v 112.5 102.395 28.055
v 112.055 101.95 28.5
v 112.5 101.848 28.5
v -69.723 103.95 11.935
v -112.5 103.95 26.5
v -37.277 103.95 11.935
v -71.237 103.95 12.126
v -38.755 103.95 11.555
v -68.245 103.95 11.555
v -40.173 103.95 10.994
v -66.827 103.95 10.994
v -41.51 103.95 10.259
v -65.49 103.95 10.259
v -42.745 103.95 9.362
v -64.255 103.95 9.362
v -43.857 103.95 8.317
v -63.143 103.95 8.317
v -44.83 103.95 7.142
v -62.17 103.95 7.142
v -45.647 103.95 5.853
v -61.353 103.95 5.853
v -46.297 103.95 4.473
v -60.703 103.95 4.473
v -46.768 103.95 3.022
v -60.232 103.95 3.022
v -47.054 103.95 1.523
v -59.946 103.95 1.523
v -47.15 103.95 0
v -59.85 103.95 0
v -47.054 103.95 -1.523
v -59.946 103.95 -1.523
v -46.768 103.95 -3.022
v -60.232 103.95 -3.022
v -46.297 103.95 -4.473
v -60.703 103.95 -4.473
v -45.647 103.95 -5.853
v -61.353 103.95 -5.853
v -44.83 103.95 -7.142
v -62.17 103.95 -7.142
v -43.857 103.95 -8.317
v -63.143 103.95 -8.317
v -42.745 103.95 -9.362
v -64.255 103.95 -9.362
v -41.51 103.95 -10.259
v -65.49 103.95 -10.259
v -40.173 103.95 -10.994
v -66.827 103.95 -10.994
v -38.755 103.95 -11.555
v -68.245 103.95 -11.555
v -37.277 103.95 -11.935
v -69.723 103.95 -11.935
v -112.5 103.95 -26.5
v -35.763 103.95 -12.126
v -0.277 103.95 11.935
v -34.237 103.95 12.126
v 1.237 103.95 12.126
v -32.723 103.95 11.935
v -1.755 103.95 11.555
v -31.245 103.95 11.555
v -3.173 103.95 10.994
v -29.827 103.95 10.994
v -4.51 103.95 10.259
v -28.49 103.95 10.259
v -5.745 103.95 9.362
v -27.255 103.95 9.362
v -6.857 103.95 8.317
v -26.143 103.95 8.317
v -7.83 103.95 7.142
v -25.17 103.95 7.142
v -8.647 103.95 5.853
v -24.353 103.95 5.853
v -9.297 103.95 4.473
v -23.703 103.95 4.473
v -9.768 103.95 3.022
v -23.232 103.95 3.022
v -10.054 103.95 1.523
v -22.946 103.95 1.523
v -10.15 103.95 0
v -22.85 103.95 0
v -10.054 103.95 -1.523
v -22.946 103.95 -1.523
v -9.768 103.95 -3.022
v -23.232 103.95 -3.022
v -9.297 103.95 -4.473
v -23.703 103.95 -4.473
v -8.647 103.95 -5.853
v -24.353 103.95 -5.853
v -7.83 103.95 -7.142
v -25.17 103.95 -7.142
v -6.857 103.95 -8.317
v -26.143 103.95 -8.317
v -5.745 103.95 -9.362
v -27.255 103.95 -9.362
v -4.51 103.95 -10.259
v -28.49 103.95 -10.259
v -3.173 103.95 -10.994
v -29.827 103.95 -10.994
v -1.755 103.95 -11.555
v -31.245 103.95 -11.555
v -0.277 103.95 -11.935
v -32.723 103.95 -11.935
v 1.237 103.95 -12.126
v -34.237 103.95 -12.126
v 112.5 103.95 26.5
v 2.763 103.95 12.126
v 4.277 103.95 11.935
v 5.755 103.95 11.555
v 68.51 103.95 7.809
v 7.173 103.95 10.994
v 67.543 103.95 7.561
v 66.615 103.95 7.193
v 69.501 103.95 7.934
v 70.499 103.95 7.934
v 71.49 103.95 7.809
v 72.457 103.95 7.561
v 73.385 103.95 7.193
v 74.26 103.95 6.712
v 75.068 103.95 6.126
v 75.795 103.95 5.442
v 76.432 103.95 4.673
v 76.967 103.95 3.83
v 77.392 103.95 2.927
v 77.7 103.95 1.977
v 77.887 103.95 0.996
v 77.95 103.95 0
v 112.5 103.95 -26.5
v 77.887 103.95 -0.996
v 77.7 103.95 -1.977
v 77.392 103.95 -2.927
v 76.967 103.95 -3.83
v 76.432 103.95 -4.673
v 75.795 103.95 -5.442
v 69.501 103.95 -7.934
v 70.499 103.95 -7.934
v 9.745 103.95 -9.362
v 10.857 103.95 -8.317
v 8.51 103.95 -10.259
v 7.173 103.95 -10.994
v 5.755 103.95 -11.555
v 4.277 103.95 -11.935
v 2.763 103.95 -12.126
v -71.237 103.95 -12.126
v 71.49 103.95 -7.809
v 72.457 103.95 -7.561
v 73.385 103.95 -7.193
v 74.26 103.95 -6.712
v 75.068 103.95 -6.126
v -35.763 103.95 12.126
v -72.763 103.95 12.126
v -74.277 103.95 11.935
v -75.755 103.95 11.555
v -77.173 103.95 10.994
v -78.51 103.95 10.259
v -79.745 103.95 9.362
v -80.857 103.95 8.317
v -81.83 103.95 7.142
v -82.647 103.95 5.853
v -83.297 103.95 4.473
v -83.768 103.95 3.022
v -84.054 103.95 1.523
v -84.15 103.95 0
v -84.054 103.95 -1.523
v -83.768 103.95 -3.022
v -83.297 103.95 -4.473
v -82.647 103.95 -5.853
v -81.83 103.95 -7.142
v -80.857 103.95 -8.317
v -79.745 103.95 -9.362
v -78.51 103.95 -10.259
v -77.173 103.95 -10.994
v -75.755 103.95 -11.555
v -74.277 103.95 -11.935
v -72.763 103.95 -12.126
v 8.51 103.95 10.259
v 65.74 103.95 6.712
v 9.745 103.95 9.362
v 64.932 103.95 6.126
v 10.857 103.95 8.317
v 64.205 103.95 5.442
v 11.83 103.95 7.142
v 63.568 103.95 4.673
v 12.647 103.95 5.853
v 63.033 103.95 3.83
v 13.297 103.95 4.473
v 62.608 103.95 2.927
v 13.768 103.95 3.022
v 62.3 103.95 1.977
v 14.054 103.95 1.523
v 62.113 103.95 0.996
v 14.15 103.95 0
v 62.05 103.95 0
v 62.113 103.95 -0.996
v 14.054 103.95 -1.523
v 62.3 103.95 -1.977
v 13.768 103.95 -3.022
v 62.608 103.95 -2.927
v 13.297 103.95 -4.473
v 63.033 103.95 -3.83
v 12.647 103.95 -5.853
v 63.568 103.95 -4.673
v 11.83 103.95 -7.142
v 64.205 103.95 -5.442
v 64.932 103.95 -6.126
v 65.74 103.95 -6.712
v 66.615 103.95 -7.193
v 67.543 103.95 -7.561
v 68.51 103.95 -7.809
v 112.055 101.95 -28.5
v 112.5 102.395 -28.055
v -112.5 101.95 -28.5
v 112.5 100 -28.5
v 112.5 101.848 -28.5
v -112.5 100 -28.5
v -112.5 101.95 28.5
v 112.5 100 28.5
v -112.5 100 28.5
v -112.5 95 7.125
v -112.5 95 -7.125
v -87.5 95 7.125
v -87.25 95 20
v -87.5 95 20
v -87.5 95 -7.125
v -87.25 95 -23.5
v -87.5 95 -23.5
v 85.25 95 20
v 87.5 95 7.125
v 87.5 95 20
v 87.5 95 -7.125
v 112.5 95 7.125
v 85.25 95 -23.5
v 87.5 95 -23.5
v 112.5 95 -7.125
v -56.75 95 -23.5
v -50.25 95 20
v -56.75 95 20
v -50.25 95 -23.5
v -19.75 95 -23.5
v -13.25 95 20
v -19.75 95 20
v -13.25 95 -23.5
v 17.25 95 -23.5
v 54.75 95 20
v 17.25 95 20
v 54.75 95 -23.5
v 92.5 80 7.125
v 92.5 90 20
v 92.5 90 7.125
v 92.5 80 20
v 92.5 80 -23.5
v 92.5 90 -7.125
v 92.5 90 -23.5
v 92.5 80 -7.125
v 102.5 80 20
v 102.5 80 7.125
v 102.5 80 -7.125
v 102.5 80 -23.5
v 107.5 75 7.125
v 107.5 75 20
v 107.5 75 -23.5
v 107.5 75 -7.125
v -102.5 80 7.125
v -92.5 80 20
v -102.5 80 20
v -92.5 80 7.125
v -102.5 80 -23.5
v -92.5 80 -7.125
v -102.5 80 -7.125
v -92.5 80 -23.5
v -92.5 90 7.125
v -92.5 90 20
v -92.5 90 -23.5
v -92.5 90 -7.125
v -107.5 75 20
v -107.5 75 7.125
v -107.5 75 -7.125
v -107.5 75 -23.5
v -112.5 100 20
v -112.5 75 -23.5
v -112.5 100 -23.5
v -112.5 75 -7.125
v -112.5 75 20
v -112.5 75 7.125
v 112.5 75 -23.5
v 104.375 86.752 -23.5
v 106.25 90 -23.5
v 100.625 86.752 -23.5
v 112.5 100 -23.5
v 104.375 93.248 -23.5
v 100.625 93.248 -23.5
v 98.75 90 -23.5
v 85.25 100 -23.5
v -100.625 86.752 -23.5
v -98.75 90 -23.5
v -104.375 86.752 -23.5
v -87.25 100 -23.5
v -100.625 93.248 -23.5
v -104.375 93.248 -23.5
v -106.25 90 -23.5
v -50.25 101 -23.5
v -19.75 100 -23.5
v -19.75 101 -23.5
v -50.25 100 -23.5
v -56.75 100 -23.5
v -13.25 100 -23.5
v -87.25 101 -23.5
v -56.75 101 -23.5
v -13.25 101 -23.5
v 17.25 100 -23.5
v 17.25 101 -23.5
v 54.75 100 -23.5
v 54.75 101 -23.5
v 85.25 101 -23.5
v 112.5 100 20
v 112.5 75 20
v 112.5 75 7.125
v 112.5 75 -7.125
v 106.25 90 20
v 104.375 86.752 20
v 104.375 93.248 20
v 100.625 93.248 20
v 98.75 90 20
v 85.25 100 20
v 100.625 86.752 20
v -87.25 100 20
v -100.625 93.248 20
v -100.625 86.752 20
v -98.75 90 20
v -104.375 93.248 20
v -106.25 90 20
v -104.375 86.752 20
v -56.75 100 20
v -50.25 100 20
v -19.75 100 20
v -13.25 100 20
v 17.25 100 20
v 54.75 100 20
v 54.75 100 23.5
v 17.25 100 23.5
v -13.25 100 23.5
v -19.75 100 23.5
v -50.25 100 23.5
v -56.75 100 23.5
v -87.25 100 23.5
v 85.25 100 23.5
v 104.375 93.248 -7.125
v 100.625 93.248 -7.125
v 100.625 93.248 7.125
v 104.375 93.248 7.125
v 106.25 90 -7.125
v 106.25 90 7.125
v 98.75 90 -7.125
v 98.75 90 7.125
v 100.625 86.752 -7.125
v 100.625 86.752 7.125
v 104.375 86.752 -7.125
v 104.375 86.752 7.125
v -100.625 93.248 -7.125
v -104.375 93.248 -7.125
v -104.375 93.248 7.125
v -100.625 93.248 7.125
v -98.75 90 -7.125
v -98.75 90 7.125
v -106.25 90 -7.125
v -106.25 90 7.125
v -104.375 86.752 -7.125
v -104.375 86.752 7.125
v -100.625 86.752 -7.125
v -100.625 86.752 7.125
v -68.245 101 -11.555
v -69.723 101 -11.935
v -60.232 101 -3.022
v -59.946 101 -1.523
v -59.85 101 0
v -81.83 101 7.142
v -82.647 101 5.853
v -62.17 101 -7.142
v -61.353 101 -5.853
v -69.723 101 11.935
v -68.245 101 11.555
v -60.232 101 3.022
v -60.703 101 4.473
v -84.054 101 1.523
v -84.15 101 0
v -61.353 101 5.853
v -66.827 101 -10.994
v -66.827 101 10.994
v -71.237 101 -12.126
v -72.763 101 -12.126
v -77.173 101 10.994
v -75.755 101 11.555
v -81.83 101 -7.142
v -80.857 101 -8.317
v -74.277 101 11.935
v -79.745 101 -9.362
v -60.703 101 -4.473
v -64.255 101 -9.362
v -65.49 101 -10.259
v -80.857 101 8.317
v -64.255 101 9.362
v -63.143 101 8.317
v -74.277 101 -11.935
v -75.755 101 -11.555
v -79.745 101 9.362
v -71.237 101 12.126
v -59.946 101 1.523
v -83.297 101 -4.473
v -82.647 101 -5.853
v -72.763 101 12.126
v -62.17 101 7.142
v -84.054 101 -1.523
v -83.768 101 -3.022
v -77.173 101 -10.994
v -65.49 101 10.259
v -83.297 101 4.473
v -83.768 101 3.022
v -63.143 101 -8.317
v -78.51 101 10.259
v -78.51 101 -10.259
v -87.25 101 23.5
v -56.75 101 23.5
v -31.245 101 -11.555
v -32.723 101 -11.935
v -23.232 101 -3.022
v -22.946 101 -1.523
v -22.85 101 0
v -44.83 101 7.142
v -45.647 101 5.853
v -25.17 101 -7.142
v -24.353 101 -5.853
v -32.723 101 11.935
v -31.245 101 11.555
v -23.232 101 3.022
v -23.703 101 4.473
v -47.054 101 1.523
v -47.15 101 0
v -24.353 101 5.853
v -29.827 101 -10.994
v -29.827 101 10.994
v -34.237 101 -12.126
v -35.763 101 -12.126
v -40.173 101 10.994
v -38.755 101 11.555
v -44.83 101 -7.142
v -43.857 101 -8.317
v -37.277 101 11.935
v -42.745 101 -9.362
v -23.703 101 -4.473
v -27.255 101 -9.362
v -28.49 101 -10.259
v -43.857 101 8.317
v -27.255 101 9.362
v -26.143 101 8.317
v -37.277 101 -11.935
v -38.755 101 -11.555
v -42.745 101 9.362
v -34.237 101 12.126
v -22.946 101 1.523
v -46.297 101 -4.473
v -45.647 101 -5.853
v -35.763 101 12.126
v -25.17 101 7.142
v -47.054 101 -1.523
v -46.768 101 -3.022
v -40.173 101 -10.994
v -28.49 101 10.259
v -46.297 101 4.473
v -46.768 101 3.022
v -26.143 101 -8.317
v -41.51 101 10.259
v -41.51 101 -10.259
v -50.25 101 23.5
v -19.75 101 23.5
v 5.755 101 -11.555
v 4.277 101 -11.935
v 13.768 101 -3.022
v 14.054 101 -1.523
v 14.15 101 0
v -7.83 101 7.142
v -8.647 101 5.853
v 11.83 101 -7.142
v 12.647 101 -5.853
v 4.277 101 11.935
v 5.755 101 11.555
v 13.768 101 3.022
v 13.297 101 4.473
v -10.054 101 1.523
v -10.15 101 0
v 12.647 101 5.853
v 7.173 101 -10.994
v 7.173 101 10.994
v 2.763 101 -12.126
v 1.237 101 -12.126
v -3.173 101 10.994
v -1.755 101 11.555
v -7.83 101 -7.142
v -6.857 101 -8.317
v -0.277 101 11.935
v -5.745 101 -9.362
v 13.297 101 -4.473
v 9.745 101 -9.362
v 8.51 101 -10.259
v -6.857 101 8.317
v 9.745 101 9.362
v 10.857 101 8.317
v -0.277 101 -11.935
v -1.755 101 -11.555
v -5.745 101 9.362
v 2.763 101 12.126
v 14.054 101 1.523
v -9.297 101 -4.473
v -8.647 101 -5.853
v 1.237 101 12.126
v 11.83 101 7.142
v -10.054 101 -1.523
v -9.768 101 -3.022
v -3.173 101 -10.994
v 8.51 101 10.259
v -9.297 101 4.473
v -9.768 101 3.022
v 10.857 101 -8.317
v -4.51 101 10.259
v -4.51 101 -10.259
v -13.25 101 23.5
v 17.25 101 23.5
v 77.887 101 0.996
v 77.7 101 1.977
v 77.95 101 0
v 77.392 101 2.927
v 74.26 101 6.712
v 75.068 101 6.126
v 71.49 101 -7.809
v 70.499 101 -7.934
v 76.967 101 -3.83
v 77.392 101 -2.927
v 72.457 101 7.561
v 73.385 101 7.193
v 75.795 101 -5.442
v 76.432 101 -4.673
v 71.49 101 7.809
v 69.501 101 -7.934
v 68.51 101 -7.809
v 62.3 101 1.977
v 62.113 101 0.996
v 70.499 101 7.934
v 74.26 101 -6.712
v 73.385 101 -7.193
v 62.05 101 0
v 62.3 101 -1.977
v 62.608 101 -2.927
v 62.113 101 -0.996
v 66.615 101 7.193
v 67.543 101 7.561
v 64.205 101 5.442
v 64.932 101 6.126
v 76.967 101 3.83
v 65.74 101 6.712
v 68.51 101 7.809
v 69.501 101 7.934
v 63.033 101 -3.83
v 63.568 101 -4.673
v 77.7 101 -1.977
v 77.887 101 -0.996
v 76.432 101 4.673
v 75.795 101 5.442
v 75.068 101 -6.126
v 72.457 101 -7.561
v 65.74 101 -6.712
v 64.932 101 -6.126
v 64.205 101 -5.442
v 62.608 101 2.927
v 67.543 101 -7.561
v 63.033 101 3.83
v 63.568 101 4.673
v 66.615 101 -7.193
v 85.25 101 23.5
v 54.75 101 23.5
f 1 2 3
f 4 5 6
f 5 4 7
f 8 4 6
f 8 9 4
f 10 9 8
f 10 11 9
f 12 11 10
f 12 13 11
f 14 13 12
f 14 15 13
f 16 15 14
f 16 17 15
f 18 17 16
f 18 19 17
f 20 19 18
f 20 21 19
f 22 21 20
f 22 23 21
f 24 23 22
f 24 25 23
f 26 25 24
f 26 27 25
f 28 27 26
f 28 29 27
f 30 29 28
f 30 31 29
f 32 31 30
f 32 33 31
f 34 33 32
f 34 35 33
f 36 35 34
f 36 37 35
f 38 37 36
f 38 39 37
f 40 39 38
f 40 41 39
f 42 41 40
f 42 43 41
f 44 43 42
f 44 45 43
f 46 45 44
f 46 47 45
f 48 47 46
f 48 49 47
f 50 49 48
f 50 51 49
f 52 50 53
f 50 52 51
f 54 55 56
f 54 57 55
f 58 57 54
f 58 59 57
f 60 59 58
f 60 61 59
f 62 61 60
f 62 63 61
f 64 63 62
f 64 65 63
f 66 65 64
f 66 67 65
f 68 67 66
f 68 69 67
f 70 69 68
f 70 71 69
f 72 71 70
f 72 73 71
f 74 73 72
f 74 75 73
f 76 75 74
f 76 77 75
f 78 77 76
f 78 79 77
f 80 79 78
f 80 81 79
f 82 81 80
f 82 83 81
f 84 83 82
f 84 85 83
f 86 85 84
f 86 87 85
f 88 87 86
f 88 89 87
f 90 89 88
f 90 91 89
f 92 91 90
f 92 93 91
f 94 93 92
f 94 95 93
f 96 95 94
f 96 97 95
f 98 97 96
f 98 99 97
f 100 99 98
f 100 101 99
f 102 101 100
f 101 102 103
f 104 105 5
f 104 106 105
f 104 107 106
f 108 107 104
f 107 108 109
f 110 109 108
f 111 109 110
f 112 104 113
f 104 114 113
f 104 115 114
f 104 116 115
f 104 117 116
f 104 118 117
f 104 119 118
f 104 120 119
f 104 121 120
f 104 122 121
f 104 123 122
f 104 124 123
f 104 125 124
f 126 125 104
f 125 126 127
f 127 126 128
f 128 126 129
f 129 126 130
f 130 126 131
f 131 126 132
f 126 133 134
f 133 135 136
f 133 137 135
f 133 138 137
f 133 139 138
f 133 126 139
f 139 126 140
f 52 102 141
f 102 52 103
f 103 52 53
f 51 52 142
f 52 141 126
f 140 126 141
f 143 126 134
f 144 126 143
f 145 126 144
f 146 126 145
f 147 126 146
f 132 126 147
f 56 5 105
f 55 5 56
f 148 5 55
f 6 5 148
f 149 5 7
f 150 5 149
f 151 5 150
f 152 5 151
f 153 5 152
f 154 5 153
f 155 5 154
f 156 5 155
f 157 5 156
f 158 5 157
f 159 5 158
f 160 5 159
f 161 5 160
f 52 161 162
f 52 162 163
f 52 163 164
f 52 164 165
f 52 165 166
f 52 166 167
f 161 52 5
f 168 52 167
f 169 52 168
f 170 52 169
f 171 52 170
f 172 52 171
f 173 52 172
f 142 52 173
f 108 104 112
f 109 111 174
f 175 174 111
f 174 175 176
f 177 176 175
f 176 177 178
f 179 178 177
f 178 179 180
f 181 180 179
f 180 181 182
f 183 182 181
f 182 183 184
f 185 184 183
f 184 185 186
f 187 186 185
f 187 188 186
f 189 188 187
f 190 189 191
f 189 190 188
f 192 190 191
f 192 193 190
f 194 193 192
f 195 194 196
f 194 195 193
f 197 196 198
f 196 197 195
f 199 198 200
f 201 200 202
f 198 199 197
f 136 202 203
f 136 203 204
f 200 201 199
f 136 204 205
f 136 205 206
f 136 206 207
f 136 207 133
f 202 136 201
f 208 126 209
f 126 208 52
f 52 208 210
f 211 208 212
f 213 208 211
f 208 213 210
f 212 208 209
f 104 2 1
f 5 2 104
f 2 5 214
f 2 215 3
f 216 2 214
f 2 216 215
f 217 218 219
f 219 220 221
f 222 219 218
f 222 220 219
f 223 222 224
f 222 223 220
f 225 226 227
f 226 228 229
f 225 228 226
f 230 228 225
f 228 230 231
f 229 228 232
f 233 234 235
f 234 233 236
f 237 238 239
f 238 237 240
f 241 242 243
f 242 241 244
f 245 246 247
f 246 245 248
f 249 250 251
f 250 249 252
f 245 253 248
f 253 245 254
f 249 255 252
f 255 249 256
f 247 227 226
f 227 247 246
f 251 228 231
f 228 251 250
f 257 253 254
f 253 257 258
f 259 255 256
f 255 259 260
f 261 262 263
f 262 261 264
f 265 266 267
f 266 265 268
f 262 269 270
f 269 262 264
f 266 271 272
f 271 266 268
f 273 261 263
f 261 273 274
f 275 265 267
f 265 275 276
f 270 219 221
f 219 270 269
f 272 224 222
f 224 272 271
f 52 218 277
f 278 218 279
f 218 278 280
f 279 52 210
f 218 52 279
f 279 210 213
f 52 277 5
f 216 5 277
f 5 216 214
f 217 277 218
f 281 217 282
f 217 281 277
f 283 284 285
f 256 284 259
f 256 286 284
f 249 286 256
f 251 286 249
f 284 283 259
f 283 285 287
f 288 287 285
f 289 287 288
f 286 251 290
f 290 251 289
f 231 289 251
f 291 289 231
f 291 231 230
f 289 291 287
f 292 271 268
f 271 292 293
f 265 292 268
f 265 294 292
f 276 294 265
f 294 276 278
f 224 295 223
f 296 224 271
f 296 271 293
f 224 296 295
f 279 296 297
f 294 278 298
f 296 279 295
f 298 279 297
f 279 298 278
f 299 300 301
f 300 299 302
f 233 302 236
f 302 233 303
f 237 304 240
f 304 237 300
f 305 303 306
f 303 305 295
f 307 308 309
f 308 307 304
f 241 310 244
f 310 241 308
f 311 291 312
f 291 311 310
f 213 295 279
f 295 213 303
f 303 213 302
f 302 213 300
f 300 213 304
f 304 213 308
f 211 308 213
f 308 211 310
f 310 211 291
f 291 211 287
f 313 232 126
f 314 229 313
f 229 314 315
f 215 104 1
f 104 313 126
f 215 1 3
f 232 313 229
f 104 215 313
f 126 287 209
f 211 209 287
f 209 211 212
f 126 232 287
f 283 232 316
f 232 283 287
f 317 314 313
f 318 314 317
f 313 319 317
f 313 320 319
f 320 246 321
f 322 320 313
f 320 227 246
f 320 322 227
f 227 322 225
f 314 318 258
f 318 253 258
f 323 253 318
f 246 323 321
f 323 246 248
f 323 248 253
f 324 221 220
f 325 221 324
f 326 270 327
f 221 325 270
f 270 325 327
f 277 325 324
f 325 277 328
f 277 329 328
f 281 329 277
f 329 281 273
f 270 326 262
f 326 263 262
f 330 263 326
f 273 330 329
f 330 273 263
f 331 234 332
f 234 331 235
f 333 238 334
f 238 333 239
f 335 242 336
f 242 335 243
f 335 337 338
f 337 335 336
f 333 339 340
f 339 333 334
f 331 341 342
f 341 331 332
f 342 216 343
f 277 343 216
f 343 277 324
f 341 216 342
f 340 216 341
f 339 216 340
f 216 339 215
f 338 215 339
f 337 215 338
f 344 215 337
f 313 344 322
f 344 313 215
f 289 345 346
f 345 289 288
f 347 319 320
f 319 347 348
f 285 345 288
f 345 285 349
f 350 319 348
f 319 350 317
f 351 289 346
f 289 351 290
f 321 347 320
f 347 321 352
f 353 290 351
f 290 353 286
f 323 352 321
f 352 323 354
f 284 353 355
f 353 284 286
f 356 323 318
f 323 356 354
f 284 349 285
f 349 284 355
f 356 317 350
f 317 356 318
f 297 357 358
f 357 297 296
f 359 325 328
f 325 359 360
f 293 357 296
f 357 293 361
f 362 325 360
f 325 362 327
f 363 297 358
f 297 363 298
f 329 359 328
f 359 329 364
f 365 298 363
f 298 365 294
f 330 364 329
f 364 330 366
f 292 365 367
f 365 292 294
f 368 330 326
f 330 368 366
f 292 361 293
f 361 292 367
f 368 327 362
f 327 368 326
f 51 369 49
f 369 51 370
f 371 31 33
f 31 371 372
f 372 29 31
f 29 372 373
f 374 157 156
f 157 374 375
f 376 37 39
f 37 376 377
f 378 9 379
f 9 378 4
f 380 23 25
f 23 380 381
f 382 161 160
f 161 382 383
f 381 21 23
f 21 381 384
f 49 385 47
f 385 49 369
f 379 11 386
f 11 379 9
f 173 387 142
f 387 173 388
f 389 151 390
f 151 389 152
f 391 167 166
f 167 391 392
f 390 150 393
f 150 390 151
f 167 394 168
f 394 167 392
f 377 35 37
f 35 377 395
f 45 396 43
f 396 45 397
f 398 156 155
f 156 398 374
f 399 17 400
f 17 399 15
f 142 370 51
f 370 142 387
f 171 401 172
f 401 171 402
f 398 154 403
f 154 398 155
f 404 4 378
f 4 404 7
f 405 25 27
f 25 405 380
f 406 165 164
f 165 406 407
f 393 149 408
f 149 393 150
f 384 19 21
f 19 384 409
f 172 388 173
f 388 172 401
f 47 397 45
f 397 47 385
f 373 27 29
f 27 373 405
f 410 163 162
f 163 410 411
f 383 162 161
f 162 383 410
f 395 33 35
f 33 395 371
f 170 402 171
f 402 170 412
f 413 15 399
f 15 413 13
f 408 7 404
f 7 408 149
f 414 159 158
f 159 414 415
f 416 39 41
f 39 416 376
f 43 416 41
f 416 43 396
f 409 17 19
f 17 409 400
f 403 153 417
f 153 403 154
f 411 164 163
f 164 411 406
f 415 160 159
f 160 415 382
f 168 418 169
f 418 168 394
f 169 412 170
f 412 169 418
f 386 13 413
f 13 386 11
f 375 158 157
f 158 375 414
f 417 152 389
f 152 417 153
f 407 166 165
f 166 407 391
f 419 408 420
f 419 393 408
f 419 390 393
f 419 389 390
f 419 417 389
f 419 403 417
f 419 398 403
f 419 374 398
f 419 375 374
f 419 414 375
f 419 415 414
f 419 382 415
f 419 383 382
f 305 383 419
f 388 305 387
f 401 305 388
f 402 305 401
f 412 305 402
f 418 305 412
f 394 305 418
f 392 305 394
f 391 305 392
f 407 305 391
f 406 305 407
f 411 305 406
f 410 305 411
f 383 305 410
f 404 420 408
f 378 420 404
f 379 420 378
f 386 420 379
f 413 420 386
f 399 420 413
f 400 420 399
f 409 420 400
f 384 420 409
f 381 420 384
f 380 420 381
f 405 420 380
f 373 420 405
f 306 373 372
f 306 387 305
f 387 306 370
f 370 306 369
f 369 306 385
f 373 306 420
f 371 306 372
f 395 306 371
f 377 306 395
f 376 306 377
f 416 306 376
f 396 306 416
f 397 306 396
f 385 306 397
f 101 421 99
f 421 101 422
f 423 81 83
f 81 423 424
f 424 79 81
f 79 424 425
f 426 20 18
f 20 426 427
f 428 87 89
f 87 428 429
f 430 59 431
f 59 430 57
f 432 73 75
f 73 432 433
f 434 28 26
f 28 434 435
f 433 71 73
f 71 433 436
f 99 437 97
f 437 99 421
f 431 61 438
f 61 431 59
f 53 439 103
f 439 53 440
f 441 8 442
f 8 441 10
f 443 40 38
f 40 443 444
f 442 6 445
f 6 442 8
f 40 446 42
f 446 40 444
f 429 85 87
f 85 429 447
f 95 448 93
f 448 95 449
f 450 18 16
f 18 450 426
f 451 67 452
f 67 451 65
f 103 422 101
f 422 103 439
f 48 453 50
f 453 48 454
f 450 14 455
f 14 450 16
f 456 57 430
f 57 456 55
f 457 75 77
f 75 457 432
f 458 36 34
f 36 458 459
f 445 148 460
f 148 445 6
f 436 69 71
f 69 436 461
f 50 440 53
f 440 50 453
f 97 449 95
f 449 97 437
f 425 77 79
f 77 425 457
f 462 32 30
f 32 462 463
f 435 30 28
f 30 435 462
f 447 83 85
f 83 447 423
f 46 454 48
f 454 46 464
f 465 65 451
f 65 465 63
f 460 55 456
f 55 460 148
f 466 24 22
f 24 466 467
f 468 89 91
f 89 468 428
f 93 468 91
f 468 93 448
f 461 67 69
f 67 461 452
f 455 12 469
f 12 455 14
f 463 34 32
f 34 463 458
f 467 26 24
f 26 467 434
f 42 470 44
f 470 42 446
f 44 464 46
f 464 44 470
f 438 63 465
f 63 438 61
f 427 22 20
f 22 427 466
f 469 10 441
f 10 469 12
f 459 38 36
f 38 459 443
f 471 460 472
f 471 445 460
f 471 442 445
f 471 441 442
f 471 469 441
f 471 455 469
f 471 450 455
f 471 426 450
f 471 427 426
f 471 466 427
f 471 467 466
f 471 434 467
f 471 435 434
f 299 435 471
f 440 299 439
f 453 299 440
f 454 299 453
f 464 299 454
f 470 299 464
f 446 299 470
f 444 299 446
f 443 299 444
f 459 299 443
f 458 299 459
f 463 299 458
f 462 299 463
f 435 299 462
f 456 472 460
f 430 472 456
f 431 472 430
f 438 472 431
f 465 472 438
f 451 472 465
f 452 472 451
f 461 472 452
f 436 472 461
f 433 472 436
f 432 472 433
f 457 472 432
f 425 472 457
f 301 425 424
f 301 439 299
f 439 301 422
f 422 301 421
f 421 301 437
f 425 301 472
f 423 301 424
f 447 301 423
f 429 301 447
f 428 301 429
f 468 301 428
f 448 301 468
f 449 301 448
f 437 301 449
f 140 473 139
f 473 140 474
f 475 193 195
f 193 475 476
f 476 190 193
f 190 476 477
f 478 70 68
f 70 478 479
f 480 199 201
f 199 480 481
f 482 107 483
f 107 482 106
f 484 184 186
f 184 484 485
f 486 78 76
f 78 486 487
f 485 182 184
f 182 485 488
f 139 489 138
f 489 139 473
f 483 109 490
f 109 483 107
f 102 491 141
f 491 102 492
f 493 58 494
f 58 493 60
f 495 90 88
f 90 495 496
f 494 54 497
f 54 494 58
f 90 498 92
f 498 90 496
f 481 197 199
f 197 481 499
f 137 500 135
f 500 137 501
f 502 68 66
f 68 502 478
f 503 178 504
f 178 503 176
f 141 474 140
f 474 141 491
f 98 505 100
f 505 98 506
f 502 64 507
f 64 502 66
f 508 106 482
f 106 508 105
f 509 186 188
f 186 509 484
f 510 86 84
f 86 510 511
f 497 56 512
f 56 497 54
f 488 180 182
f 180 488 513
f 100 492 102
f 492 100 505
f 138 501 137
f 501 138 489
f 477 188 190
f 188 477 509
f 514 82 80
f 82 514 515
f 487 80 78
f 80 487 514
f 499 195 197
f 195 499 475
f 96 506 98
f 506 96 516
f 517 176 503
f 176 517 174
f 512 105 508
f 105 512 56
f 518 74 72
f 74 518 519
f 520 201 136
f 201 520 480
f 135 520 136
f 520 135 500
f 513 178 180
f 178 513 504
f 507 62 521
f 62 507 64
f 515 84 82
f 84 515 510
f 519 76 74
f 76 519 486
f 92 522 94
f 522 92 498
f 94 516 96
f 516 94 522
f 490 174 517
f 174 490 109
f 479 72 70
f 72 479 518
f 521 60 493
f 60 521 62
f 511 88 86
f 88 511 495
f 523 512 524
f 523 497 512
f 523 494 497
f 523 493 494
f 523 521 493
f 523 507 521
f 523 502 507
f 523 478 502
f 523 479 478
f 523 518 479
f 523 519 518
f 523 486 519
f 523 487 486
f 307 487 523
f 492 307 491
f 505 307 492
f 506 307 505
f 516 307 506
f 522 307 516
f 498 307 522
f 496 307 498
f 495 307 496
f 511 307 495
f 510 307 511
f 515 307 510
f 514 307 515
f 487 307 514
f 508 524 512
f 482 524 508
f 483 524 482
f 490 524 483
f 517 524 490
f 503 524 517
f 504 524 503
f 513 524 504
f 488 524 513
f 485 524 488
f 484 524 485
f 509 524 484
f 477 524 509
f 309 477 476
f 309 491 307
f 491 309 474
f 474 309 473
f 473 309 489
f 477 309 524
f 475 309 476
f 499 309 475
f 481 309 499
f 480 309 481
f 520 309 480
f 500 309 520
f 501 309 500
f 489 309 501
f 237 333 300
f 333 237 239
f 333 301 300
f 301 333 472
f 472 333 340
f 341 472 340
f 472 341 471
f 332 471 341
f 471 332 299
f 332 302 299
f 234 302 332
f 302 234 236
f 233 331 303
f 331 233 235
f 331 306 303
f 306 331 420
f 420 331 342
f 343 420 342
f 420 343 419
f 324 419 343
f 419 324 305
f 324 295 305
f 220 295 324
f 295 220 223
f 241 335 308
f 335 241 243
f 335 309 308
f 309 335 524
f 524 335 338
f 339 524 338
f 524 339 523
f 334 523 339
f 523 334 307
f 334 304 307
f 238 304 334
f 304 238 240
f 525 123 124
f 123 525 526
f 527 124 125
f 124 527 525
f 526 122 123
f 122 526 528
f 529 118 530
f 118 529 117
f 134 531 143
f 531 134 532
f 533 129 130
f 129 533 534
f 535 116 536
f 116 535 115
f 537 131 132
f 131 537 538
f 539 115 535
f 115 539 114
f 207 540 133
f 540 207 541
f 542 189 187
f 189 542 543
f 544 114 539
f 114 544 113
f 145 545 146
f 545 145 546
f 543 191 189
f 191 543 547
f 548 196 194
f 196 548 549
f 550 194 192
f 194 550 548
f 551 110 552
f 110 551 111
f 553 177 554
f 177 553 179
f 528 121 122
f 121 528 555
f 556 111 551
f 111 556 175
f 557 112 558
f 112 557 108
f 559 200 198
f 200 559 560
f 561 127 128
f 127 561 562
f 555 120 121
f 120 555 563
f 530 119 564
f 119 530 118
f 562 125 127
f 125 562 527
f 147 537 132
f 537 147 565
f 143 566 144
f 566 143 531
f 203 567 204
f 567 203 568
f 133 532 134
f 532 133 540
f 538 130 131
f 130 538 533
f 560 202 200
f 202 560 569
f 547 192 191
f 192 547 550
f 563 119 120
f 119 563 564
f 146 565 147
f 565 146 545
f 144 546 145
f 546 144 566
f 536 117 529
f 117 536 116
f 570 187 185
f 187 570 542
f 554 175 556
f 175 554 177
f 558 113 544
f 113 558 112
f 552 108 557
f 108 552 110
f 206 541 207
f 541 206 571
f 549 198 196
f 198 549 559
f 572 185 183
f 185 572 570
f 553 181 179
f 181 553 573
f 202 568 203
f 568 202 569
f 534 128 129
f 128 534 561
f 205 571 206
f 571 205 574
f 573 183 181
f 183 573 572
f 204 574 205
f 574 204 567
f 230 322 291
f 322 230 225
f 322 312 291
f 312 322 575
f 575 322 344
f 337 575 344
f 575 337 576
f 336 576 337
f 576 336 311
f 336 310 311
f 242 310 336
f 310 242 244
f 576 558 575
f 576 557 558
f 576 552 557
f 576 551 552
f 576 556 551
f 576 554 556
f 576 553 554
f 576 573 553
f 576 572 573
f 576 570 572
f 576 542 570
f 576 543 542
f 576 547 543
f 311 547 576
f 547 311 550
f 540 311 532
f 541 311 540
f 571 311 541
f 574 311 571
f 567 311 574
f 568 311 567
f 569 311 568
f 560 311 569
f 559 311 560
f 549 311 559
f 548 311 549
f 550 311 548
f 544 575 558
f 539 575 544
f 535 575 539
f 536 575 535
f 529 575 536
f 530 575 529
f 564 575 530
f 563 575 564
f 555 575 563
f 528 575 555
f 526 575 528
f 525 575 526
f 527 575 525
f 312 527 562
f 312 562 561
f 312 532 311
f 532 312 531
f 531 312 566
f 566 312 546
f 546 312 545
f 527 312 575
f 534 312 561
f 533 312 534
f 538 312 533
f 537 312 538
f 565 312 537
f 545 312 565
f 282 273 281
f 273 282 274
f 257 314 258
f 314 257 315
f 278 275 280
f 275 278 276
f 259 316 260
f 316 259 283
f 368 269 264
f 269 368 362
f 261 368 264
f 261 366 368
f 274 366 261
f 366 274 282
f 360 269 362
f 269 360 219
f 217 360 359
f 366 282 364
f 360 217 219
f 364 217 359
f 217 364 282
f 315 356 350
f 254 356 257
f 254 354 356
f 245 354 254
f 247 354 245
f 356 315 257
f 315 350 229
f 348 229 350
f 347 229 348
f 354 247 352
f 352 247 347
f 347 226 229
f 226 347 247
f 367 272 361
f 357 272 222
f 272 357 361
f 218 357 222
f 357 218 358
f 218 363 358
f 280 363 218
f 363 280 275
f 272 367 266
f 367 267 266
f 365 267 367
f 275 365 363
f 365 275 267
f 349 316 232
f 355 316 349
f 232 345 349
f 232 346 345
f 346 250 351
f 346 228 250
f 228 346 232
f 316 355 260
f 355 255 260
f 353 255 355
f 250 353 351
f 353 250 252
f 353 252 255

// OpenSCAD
// file: frame-left.scad
/*
 * SPDX-FileCopyrightText: © 2023 Brian S. Stephan <bss@incorporeal.org>
 * SPDX-License-Identifier: GPL-3.0-or-later
 */

include <parameters.scad>
include <components.scad>

module base_left_frame(lower=false) {
	difference() {
		frame(lower=lower);
		// chop the right edge off
		side_chopper();
	}
}

module left_frame(lower=false) {
	difference() {
		base_left_frame(lower=lower);
		// connection holes to other frames
		frame_connection_holes();

		// cable routing hole
		frame_cable_routing_hole();

		// aux button holes
		translate([-35, 101.5, 0]) rotate([270, 0, 0]) aux_control_three_button_cluster();
		translate([-35, (frame_y/2)-neutrik_panel_thickness-4, 0]) frame_cutout();
		translate([-72, (frame_y/2)-neutrik_panel_thickness-4, 0]) frame_cutout();
		translate([2, (frame_y/2)-neutrik_panel_thickness-4, 0]) frame_cutout();

		// neutrix button hole
		translate([frame_center_to_neutrik, (frame_y/2)-neutrik_panel_thickness, 0])
			rotate([90, 0, 0]) neutrik_d_mount();
		translate([frame_center_to_neutrik, (frame_y/2)-neutrik_panel_thickness-4, 0])
			frame_cutout();
	}
}

left_frame();
// file: frame-left-gx16.scad
/*
 * SPDX-FileCopyrightText: © 2023 Brian S. Stephan <bss@incorporeal.org>
 * SPDX-FileCopyrightText: © 2023 Luis Sebastián <buran@silosneeded.com>
 * SPDX-License-Identifier: GPL-3.0-or-later
 */

include <parameters.scad>
include <components.scad>
use <frame-left.scad>

module left_frame_gx16(lower=false) {
    difference() {
        base_left_frame(lower=lower);
        // connection holes to other frames
        frame_connection_holes();

        // cable routing hole
        frame_cable_routing_hole();

        // aux button holes
        translate([-35, 101.5, 0]) rotate([270, 0, 0]) aux_control_three_button_cluster();
        translate([-35, (frame_y/2)-neutrik_panel_thickness-4, 0]) frame_cutout();
        translate([-72, (frame_y/2)-neutrik_panel_thickness-4, 0]) frame_cutout();
        translate([2, (frame_y/2)-neutrik_panel_thickness-4, 0]) frame_cutout();
        
        // GX16 connector hole
		translate([frame_center_to_neutrik, (frame_y/2)-neutrik_panel_thickness, 0])
			rotate([90, 0, 0]) gx16_mount();
		translate([frame_center_to_neutrik, (frame_y/2)-neutrik_panel_thickness-4, 0])
			frame_cutout();
    }
}

left_frame_gx16();
// file: parameters.scad
/*
 * SPDX-FileCopyrightText: © 2023 Brian S. Stephan <bss@incorporeal.org>
 * SPDX-License-Identifier: GPL-3.0-or-later
 */

// adjustments
hole_tolerance = 0.15;

// M2
m2_screw_selftap_radius = 0.95;

// M3
m3_screw_selftap_radius = 1.3;

// M4
m4_bolt_radius = 2 + hole_tolerance;
m4_bolt_countersink_radius = 6.1 + hole_tolerance;
m4_bolt_hex_exterior_radius = 3.6 + hole_tolerance;

// 24mm button
small_button_radius = 12 + hole_tolerance;

// 30mm button
big_button_radius = 15 + hole_tolerance;

// JLF mount dimensions
lever_mount_x = 53;
lever_mount_y = 95;
lever_mount_z = 2;

// standard lever hole
lever_plate_hole = 12;

// korean lever hole
korean_lever_plate_hole = 17.6;

// case dimensions
// base frame box. reminder: top of inside (including mounts) is chopped by panel_z for plates
frame_x = 233;
frame_y = 208;
frame_z = 57;

// degree to which the extended frame pieces stick out from the end of the frame
frame_extension_x = 25;
frame_extension_y = 25;

// this sinks the bottom and top of the frame inward a bit, and is used to math out two shapes
// when creating the frame box / overhang panel
frame_bevel_height = 2;
overhang_panel_bevel_height = 1;

frame_center_to_neutrik = 70;

// depth of the "lip" of the frame that the top plate sets into/supports the overhang
frame_wall = 4;

// width of the column in the frame corners to support the hex bolt
frame_mount_column_width = 20;

// per neutrik (mm)
neutrik_panel_thickness = 3;

// top plate, which can either be the whole plate ("inset") or the mounting frame for a plate that overhangs
panel_x = frame_x - (frame_wall * 2);
panel_y = frame_y - (frame_wall * 2);
panel_z = 5;

// how much the top plate x/y is expanded to overhang the frame
// note that this is relative to the top plate (so the wall is added back)
panel_overhang_amount = 8.5;
overhang_panel_x = panel_x + (frame_wall * 2) + (panel_overhang_amount * 2);
overhang_panel_y = panel_y + (frame_wall * 2) + (panel_overhang_amount * 2);

panel_to_frame_point_x = (panel_x/2)-10;
panel_to_frame_point_y = (panel_y/2)-10;

// frame interior that supports the top plates
panel_support_width = 5;

// neutrik D screw holes
neutrik_d_screw_radius = 1.6 + hole_tolerance;
neutrik_d_radius = 12 + hole_tolerance;

// GX 16 holes
gx16_radius = 7.8 + hole_tolerance;

// additional button radius for decorative panels, etc.
decorative_radius_scale = 1.75;
jumbo_decorative_radius_scale = 2;
// main file
/*
 * SPDX-FileCopyrightText: © 2023 Brian S. Stephan <bss@incorporeal.org>
 * SPDX-FileCopyrightText: © 2023 Luis Sebastián <buran@silosneeded.com>
 * SPDX-License-Identifier: GPL-3.0-or-later
 */

include <parameters.scad>
include <components.scad>
use <frame-left-gx16.scad>

module top_left_or_right_frame_piece_gx16(lower=false) {
    piece_width = panel_support_width+frame_wall+frame_mount_column_width;

	intersection() {
		left_frame_gx16(lower=lower);
		difference() {
			// include the whole top wall (including mount columns)
			translate([0, (frame_y/2)-(piece_width/2), 0]) cube([frame_x, piece_width, frame_z], center=true);
			// ...minus the frame wall and lip on the left
			translate([-frame_x/2+frame_wall/2, 0, 0])
				cube([frame_wall, frame_y, frame_z], center=true);
			// ...minus a slot for the combining piece to go into
			cube([frame_x, frame_y-(panel_support_width+frame_wall)*2, frame_z/4], center=true);
		}
	}
}

top_left_or_right_frame_piece_gx16(lower=true);
